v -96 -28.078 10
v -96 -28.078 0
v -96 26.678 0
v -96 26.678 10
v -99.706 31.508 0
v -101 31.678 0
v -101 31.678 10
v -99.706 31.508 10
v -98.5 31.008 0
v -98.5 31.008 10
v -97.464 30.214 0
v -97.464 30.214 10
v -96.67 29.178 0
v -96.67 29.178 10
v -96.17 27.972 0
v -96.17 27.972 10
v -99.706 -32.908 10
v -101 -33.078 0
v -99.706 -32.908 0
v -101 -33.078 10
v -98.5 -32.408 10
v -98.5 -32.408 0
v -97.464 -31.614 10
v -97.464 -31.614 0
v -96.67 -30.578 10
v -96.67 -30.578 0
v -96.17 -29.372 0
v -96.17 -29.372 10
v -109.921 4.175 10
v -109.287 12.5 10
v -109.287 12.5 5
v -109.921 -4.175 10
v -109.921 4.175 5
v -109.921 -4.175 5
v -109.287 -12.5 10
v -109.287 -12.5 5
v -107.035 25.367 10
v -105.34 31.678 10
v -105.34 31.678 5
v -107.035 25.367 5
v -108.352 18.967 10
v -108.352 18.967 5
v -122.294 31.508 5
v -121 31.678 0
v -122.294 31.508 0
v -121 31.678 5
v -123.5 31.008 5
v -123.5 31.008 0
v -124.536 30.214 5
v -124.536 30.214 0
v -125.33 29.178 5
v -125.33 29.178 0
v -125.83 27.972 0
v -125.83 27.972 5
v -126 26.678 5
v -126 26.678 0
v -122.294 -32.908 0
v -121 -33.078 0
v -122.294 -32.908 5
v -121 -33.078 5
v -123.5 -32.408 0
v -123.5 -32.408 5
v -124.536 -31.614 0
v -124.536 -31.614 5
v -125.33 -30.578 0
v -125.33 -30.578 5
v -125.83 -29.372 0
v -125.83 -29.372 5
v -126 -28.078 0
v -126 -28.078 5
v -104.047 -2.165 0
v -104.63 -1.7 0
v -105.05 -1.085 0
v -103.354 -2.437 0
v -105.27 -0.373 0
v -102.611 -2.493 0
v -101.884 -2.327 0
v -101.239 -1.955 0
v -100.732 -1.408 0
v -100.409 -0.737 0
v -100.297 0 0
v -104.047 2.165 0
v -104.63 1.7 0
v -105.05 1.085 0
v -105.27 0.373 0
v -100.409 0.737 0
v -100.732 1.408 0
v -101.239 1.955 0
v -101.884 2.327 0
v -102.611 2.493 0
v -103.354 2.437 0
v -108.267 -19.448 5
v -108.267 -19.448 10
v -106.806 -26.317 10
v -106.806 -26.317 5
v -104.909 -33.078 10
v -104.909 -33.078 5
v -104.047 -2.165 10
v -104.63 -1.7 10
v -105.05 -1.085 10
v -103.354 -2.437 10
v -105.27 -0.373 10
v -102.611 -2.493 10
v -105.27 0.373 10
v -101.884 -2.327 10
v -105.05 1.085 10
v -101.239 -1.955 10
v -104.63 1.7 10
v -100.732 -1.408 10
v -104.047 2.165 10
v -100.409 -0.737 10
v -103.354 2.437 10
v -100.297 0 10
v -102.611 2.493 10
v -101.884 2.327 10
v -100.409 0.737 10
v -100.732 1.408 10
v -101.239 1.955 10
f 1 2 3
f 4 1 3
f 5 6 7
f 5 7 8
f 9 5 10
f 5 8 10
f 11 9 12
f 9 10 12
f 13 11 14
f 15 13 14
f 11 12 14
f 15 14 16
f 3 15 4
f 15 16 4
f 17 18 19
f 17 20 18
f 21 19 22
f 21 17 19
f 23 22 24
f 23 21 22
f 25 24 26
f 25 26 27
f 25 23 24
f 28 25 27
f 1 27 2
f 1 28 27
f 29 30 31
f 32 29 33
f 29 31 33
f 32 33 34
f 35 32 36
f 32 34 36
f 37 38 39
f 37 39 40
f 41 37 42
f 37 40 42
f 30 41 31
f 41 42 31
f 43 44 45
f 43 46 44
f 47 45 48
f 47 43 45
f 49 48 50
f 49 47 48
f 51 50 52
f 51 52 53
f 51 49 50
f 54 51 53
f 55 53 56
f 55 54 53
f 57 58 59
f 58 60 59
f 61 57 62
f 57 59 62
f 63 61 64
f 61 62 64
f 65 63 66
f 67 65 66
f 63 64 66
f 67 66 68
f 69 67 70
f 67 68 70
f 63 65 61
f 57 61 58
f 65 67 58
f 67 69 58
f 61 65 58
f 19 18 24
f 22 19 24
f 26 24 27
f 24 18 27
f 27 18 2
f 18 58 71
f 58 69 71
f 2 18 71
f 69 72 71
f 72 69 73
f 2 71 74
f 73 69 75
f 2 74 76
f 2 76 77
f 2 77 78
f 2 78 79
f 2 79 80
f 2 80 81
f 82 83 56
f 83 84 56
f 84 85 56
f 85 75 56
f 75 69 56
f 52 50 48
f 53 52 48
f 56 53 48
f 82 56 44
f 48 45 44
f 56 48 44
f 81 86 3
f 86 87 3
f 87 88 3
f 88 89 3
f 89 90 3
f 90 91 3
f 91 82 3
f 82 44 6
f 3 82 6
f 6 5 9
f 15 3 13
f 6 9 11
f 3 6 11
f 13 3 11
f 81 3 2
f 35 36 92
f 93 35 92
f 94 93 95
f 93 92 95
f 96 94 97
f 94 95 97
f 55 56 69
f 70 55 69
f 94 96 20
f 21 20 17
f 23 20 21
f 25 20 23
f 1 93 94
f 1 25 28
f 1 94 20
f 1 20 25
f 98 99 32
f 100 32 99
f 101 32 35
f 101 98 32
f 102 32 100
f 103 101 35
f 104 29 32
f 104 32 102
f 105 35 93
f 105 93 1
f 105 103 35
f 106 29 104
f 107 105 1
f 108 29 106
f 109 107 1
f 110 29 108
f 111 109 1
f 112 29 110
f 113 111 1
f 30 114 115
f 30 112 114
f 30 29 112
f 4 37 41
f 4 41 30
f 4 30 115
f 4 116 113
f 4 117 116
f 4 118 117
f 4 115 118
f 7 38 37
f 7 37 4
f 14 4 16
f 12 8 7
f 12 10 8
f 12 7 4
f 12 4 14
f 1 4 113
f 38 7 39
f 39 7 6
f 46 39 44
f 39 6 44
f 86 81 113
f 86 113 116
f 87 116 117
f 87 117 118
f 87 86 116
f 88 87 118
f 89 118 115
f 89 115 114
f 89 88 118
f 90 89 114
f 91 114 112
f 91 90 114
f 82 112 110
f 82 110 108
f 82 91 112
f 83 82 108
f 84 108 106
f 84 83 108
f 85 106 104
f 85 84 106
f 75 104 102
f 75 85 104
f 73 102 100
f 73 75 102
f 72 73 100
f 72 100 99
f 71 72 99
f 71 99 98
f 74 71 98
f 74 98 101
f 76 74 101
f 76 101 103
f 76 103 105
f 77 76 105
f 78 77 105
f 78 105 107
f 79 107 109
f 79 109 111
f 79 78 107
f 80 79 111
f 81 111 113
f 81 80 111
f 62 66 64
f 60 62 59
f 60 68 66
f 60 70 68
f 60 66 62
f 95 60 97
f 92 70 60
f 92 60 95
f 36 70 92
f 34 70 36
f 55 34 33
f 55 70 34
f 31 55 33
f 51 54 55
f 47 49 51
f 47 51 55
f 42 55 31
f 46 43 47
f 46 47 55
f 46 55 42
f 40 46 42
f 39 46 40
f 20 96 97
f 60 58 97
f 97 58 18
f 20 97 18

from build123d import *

# Parameters (mm, degrees)
F0_R     = 2.5
F1_DEPTH = 10
F2_DEPTH = 5
F3_R     = 5


with BuildPart() as f1:
    # F0 (on Top) → F1 (new body)
    with BuildSketch(Plane.XY):
        with BuildLine():
            ThreePointArc((-105.3399322968, 31.6780470312), (-107.7412608362, 22.1770312131), (-109.287464972, 12.5))
            ThreePointArc((-109.287464972, 12.5), (-110, 0), (-109.287464972, -12.5))
            ThreePointArc((-109.287464972, -12.5), (-107.5911875881, -22.8940244035), (-104.9086893631, -33.0781936646))
            Line((-104.9086893631, -33.0781936646), (-96, -33.0781936646))
            Line((-96, -33.0781936646), (-96, 31.6780470312))
            Line((-96, 31.6780470312), (-105.3399322968, 31.6780470312))
        make_face()
        with Locations((-102.7974784374, 0)):
            Circle(F0_R, mode=Mode.SUBTRACT)
    extrude(amount=F1_DEPTH)

    # F0 (on Top) → F2 (join)
    with BuildSketch(Plane.XY):
        with BuildLine():
            Line((-110, 12.5), (-109.287464972, 12.5))
            ThreePointArc((-109.287464972, 12.5), (-107.7412608362, 22.1770312131), (-105.3399322968, 31.6780470312))
            Line((-105.3399322968, 31.6780470312), (-126, 31.6780470312))
            Line((-126, 31.6780470312), (-126, 12.5))
            Line((-126, 12.5), (-110, 12.5))
        make_face()
        with BuildLine():
            ThreePointArc((-109.287464972, -12.5), (-110, 0), (-109.287464972, 12.5))
            Line((-109.287464972, 12.5), (-110, 12.5))
            Line((-110, 12.5), (-126, 12.5))
            Line((-126, 12.5), (-126, -12.5))
            Line((-126, -12.5), (-110, -12.5))
            Line((-110, -12.5), (-109.287464972, -12.5))
        make_face()
        with BuildLine():
            ThreePointArc((-104.9086893631, -33.0781936646), (-107.5911875881, -22.8940244035), (-109.287464972, -12.5))
            Line((-109.287464972, -12.5), (-110, -12.5))
            Line((-110, -12.5), (-126, -12.5))
            Line((-126, -12.5), (-126, -33.0781936646))
            Line((-126, -33.0781936646), (-104.9086893631, -33.0781936646))
        make_face()
    extrude(amount=F2_DEPTH)

    # F3
    f3_edges = [f1.edges().sort_by_distance(p)[0] for p in [
        (-126, -33.078194, 2.5),
        (-96, -33.078194, 5),
        (-126, 31.678047, 2.5),
        (-96, 31.678047, 5),
    ]]
    fillet(f3_edges, radius=F3_R)


solid = f1.part
